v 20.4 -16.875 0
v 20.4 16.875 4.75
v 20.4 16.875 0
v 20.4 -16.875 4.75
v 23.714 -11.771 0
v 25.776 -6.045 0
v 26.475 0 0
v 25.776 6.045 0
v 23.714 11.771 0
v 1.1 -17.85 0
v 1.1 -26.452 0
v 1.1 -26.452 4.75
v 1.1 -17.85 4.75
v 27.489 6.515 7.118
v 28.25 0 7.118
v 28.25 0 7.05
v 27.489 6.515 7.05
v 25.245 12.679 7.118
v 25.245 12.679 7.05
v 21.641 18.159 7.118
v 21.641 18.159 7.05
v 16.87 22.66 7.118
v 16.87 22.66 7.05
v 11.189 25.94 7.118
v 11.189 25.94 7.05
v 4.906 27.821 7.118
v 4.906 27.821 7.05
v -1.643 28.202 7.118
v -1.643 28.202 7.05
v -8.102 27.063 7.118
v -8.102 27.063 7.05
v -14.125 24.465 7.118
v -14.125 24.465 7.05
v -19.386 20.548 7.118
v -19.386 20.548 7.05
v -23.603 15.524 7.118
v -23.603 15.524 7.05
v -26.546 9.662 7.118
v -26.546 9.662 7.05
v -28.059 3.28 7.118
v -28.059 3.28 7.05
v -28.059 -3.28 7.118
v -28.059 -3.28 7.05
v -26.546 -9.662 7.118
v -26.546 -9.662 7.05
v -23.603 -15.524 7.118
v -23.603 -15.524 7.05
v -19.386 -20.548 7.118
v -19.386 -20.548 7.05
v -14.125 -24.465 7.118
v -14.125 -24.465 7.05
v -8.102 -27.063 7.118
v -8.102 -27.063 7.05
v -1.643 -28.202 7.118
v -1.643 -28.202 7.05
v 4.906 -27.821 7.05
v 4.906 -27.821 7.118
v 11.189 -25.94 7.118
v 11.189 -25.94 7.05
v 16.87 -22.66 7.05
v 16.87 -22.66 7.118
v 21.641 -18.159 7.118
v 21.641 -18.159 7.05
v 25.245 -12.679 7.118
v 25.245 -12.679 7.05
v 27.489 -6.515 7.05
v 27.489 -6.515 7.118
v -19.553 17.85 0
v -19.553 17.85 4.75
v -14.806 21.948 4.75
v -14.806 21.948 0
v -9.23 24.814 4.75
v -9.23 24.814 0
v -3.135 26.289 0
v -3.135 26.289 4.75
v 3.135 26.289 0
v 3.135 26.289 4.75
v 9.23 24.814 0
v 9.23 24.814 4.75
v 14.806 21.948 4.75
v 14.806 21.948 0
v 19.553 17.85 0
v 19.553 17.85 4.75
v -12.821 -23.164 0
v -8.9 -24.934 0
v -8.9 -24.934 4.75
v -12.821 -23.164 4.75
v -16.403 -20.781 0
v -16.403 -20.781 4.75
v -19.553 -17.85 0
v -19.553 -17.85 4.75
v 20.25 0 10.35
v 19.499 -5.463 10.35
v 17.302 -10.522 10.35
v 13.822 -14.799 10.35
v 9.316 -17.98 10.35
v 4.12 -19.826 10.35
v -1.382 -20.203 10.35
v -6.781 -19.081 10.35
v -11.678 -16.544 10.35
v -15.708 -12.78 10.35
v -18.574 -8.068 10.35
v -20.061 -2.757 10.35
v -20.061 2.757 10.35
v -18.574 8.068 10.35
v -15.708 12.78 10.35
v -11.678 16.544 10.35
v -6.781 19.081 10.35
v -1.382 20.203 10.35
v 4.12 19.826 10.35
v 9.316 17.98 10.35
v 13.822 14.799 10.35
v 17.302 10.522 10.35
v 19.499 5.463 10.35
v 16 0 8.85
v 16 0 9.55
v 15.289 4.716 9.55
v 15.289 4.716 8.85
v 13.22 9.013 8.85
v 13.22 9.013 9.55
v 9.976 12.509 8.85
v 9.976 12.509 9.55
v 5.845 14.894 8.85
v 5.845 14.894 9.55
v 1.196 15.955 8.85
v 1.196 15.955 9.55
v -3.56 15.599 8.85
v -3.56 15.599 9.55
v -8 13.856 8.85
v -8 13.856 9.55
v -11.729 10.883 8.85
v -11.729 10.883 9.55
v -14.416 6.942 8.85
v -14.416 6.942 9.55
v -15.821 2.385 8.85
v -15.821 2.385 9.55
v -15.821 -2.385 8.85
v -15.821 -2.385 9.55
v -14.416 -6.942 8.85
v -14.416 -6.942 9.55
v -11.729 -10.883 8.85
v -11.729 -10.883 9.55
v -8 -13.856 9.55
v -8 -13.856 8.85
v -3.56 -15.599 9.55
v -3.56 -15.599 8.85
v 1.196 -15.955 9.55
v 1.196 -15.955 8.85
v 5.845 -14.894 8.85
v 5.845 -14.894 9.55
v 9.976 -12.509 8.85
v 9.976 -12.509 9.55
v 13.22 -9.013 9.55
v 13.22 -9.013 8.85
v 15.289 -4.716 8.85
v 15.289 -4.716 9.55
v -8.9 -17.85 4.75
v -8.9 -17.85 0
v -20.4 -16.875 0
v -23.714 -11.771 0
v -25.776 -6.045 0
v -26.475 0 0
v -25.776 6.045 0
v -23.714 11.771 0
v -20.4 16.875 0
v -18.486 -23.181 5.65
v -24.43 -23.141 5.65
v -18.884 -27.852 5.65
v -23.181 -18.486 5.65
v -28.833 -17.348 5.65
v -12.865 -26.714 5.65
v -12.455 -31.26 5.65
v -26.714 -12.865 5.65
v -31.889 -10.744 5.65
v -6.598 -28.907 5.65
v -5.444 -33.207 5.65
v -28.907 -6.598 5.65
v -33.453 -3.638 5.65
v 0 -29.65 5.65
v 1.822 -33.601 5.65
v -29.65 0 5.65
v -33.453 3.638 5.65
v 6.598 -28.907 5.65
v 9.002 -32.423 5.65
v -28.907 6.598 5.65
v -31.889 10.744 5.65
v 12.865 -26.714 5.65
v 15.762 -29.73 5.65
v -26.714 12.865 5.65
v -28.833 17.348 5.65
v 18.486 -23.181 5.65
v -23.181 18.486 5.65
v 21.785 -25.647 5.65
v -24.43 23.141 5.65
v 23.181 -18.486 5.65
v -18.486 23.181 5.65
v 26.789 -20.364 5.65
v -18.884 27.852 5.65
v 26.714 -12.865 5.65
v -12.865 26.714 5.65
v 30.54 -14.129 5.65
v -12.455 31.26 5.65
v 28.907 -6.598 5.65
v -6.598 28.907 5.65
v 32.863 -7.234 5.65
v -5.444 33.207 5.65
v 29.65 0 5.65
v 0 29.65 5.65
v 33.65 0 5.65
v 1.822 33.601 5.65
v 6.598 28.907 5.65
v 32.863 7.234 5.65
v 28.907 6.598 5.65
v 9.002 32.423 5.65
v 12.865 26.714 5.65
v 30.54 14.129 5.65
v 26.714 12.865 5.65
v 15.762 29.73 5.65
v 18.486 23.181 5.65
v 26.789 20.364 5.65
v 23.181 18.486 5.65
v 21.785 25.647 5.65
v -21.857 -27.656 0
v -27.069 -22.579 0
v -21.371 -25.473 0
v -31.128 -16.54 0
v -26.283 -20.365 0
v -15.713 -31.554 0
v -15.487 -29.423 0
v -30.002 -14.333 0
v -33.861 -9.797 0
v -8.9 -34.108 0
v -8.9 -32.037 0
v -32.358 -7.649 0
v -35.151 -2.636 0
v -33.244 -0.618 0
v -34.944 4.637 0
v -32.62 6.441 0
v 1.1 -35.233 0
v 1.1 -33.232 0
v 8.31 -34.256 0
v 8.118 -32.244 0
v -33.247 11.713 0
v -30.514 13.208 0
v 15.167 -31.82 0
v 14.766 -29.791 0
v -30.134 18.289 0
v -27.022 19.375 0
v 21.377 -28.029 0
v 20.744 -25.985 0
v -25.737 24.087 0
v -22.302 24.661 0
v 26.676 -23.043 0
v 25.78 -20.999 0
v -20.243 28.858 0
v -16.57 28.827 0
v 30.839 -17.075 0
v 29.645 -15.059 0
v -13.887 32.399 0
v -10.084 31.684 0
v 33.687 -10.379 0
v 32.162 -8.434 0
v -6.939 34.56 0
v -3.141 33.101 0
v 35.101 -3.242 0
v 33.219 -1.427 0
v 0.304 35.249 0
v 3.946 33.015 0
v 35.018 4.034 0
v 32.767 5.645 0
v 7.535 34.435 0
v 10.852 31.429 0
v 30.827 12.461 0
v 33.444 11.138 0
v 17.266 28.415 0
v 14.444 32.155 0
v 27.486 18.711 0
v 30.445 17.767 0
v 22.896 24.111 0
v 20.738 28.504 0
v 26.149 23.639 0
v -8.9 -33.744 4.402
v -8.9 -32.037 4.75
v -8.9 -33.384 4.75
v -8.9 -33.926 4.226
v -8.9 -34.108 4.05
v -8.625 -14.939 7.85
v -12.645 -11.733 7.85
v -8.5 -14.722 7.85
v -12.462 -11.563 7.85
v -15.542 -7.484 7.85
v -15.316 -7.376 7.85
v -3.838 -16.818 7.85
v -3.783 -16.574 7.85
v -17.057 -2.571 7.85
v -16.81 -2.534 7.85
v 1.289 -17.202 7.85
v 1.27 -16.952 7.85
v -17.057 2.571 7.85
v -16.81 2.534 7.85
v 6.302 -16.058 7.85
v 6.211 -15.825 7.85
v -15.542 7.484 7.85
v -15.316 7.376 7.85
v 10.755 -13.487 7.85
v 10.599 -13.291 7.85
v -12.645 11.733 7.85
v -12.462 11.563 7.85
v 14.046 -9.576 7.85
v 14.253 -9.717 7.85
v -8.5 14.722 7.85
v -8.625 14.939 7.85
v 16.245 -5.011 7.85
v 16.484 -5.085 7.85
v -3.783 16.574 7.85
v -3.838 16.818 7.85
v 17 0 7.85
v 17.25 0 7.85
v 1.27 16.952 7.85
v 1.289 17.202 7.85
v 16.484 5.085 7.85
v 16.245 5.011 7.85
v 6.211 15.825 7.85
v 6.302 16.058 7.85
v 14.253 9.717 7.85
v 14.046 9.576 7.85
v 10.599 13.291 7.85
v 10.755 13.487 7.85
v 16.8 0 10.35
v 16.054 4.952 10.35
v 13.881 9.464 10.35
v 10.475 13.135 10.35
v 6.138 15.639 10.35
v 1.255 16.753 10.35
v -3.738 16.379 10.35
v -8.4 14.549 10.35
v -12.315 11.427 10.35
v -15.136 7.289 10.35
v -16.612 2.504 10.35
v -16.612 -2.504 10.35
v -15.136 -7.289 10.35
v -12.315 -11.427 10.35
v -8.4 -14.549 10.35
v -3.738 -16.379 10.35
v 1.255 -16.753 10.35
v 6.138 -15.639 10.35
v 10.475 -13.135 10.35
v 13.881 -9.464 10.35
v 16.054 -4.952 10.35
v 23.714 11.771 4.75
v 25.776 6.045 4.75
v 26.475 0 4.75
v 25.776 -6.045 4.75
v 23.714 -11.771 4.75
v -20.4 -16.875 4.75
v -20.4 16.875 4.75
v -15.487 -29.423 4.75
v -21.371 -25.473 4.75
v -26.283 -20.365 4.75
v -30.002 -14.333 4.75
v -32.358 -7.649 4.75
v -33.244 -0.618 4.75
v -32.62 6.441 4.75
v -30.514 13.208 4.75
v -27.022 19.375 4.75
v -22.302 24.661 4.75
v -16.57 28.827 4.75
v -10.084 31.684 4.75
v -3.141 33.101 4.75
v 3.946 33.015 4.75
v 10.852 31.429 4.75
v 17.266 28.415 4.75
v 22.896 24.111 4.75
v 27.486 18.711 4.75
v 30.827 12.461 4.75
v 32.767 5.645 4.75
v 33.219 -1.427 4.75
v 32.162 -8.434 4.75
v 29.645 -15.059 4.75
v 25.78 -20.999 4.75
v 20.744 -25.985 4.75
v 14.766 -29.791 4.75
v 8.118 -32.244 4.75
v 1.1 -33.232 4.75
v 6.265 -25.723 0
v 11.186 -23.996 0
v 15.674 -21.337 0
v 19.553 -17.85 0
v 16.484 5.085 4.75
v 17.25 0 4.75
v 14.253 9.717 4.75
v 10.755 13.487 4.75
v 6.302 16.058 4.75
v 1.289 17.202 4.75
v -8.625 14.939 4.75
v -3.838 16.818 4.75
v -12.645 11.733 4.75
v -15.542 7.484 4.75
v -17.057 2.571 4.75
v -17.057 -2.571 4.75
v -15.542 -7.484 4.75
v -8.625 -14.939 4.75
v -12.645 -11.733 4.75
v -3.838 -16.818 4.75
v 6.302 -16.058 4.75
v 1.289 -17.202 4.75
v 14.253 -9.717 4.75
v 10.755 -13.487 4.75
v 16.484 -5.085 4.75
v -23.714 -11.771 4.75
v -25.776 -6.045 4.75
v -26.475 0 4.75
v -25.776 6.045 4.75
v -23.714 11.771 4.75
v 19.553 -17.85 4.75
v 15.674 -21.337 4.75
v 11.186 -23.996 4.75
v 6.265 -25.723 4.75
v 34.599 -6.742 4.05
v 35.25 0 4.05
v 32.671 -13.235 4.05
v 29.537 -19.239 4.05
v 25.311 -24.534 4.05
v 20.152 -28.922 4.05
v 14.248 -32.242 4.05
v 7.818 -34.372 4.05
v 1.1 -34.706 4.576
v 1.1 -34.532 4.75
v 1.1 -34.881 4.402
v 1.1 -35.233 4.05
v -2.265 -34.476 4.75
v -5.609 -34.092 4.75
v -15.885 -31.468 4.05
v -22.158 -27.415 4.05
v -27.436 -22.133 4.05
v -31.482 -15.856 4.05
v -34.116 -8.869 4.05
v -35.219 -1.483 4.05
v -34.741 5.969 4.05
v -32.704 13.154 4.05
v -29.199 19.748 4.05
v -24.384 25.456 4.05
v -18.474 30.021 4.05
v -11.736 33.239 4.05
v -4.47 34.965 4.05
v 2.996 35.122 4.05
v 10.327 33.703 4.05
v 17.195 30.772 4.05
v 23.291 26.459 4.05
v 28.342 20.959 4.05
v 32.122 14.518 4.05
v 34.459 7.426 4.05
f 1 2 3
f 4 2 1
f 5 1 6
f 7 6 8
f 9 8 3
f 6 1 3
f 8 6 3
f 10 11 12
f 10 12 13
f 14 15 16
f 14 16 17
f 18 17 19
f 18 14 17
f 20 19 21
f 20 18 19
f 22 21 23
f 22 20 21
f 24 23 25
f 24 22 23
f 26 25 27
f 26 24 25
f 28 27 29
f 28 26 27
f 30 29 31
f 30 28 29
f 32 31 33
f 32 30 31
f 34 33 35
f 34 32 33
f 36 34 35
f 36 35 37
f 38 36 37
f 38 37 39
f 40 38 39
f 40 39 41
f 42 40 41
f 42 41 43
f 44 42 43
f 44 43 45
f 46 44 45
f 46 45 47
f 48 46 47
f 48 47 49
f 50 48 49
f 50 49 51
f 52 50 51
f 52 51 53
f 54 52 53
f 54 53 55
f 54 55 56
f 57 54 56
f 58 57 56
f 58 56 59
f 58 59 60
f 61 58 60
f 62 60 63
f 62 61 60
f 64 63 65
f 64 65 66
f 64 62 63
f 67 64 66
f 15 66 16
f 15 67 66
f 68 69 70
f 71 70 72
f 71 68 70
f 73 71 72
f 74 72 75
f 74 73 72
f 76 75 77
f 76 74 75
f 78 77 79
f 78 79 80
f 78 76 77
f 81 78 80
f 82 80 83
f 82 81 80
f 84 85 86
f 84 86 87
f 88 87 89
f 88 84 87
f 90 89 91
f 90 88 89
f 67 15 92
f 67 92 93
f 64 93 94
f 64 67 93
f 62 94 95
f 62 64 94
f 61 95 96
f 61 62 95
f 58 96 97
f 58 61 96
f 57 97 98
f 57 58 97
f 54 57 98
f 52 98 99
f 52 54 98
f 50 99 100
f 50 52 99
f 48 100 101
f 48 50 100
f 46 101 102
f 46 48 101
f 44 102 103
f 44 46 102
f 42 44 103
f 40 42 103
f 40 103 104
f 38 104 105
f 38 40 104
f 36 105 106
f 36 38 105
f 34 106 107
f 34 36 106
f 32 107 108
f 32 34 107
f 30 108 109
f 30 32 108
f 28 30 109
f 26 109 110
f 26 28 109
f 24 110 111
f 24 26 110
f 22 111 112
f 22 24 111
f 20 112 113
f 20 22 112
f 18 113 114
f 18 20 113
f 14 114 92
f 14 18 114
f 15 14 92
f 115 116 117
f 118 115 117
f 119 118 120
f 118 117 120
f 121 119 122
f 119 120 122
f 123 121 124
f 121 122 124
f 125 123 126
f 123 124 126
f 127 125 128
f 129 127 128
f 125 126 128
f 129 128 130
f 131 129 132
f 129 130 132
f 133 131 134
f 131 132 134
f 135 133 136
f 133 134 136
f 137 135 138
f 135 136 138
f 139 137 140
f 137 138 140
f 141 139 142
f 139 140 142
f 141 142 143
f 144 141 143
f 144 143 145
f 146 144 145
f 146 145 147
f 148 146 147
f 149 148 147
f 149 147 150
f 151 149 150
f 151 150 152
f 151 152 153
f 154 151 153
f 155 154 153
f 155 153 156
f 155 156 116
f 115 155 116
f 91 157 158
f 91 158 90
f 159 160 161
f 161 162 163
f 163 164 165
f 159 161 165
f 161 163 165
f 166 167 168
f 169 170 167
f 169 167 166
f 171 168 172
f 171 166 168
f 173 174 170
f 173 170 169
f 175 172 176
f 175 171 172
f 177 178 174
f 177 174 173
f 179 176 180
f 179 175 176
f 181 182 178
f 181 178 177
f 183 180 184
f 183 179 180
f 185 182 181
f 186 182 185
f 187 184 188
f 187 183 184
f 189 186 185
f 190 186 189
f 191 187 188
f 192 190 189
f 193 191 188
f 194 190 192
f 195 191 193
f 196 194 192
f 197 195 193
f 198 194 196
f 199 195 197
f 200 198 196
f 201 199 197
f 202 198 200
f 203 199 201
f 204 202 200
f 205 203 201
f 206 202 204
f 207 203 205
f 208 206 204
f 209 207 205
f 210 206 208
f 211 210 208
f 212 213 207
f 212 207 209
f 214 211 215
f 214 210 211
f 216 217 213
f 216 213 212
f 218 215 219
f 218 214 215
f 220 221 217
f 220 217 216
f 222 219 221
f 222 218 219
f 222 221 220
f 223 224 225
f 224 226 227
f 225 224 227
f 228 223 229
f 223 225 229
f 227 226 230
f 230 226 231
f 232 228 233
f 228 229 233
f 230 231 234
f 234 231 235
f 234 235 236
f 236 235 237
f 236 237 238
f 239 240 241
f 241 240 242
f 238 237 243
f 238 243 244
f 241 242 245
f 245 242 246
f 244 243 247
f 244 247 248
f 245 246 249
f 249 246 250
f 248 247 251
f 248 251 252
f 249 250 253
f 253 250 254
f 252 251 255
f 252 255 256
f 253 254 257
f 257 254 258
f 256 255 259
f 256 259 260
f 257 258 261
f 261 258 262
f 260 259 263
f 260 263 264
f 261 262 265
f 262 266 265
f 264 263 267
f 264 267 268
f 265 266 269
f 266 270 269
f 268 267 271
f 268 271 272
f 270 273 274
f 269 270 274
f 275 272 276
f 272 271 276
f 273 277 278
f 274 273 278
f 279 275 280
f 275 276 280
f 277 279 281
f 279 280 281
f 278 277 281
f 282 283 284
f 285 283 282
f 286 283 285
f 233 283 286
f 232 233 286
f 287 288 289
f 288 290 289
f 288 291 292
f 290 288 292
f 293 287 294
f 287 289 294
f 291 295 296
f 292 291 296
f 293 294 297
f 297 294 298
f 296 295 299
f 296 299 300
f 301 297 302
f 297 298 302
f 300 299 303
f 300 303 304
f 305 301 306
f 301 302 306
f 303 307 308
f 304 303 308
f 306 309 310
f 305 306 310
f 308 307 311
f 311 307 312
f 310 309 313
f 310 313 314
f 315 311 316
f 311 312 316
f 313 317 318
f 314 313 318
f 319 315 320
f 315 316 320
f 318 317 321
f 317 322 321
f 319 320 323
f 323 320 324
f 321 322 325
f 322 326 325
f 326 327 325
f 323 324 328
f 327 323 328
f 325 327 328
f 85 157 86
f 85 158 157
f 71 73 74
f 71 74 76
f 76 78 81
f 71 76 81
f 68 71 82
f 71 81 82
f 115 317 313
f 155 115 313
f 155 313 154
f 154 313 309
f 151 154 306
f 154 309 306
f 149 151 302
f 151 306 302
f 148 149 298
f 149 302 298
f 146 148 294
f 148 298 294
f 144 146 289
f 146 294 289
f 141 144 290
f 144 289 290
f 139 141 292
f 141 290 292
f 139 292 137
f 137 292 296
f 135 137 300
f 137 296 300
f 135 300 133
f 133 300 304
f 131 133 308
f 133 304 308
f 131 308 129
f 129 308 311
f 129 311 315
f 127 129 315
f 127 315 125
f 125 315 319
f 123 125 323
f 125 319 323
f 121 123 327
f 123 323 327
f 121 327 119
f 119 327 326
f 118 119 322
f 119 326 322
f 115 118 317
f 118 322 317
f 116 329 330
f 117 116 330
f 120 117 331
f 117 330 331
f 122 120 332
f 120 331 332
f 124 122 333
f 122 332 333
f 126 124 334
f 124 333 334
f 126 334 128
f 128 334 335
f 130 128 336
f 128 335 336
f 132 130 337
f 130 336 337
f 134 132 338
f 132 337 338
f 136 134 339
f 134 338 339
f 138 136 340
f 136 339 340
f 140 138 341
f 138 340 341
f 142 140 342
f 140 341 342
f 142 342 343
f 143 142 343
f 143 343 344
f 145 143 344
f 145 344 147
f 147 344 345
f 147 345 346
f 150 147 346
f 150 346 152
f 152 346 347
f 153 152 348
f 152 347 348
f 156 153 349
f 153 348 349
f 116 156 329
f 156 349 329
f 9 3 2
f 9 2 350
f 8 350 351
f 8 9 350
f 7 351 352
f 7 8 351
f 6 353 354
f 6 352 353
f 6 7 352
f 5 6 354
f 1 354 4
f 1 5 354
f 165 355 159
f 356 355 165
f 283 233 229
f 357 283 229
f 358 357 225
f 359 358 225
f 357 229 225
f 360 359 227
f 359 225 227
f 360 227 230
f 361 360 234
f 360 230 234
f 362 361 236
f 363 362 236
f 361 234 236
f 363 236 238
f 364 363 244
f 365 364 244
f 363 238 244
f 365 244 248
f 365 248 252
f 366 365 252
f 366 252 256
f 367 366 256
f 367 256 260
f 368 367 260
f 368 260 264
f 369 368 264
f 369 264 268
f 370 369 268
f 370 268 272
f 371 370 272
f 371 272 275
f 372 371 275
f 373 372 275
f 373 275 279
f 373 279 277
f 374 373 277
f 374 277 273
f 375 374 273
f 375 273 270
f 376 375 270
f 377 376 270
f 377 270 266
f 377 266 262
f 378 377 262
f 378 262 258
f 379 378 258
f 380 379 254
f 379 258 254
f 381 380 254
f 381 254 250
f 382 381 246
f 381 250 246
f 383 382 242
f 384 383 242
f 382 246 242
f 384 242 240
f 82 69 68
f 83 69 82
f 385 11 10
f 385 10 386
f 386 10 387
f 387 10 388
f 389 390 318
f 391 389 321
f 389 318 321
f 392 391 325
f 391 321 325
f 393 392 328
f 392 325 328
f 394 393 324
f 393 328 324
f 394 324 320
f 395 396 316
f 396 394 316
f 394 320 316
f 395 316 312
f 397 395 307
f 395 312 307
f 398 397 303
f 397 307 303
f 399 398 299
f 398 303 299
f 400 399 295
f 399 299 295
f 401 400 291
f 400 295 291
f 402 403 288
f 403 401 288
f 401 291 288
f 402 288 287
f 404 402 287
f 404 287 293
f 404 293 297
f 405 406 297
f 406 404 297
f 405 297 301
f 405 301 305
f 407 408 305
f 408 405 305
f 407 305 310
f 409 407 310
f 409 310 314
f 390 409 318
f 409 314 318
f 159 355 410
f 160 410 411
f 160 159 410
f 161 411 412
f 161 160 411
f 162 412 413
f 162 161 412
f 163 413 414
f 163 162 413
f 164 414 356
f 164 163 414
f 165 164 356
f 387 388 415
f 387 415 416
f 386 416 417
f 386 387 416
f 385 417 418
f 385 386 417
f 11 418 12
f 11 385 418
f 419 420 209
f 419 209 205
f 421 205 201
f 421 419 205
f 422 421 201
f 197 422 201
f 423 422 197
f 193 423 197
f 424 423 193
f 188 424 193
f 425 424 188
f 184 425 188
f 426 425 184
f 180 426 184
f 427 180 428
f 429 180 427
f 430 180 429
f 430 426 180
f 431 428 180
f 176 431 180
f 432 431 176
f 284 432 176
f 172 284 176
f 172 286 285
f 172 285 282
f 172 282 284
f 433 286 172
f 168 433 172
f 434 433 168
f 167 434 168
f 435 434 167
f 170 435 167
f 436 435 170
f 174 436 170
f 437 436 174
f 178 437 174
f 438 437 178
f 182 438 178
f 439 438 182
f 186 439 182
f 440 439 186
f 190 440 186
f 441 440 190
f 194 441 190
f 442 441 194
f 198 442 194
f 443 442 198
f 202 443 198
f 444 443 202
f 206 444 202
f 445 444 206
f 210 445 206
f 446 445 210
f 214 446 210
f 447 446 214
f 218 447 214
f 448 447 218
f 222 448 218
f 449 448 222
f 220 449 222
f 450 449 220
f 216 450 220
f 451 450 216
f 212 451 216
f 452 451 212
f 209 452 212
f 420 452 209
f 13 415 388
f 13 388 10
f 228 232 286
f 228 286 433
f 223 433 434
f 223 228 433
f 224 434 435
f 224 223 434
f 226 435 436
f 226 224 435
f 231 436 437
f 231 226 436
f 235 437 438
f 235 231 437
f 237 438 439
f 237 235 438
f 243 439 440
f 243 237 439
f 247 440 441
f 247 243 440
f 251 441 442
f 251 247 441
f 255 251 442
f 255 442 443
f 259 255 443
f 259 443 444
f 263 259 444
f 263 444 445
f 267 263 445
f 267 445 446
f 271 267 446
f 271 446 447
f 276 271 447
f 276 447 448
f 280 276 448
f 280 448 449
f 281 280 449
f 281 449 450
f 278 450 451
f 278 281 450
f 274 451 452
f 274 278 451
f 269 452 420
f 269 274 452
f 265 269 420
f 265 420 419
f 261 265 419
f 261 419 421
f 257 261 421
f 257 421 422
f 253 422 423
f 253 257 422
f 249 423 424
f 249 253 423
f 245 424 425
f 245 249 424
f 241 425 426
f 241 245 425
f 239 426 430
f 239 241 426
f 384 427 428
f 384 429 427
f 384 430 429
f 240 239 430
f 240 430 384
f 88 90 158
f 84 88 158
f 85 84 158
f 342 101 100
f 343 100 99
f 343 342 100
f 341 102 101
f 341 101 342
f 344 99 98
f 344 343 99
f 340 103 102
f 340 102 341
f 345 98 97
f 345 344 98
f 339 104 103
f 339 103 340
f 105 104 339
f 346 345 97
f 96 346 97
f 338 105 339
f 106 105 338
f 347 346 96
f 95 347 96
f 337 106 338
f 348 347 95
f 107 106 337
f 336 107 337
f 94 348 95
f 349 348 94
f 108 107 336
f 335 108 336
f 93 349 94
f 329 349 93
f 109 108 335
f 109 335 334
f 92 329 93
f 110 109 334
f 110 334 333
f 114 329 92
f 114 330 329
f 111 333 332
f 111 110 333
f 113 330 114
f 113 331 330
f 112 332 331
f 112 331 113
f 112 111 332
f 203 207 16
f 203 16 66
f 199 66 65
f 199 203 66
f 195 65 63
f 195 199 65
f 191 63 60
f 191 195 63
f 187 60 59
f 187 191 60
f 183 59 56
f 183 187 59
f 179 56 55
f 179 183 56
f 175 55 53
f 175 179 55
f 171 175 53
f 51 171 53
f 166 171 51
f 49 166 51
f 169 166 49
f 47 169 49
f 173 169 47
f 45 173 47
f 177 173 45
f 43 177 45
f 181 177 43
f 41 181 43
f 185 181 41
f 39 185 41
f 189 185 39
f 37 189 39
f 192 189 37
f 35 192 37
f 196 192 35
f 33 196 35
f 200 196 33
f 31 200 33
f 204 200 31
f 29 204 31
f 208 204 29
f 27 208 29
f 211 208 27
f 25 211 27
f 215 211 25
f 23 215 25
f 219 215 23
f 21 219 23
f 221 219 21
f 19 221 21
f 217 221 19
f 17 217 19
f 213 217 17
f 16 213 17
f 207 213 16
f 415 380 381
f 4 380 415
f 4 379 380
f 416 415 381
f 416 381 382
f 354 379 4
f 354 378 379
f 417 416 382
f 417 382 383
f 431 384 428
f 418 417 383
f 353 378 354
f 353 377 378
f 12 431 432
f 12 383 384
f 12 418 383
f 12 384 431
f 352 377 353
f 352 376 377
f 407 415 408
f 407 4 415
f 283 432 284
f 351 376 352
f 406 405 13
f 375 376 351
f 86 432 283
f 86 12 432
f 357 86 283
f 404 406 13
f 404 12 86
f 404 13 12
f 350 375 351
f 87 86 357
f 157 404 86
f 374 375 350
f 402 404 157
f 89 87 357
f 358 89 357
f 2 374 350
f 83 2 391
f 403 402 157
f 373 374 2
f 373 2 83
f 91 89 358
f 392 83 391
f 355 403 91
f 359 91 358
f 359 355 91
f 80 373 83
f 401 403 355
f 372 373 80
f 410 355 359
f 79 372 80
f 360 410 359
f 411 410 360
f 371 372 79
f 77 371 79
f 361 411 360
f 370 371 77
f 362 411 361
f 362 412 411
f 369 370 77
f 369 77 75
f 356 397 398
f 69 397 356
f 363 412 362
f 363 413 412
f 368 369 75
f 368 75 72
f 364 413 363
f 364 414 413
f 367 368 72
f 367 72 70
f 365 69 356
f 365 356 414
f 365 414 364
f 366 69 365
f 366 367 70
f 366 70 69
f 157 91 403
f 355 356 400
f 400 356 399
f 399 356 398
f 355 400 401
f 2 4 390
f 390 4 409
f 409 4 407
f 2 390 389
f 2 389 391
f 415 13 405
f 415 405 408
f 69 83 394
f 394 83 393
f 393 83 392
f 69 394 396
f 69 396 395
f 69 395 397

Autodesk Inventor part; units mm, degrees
ref_plane "YZ Plane" through (0, 0, 0) normal (1, 0, 0) x (0, 1, 0)
ref_plane "XZ Plane" through (0, 0, 0) normal (0, 1, 0) x (-1, 0, 0)
ref_plane "XY Plane" through (0, 0, 0) normal (0, 0, 1) x (1, 0, 0)
sketch "Sketch1" plane through (0, 0, 0) normal (0, 0, 1) x (1, 0, 0)
  circle A0 centre (0, 0) radius 33.25
  circle A1 centre (0, 0) radius 26.475
  circle A2 centre (0, 0) radius 35.25
  dimension "d0" = 66.5
  dimension "d1" = 52.95
  dimension "d2" = 2
extrude "Extrusion1" add sketch "Sketch1" along normal blind 10.35
sketch "Sketch2" plane through (0, 0, 10.35) normal (0, 0, 1) x (1, 0, 0)
  circle A0 centre (0, 0) radius 35.25 projected
extrude "Extrusion2" add sketch "Sketch2" against normal blind 0.5
sketch "Sketch3" plane through (0, 0, 10.35) normal (0, 0, 1) x (1, 0, 0)
  circle A0 centre (0, 0) radius 16
  dimension "d7" = 32
extrude "Extrusion3" cut sketch "Sketch3" against normal blind 2.5
sketch "Sketch4" plane through (0, 0, 7.85) normal (0, 0, 1) x (1, 0, 0)
  circle A0 centre (0, 0) radius 17.25
  dimension "d10" = 34.5
extrude "Extrusion4" cut sketch "Sketch4" against normal blind 3.1
sketch "Sketch5" plane through (0, 0, 4.75) normal (0, 0, 1) x (1, 0, 0)
  line L0 (-20.4, 17.85) -> (20.4, 17.85)
  line L1 (20.4, 17.85) -> (20.4, -17.85)
  line L2 (20.4, -17.85) -> (-20.4, -17.85)
  line L3 (-20.4, -17.85) -> (-20.4, 17.85)
  point P0 (0, 0)
  dimension "d13" = 40.8
  dimension "d14" = 35.7
  dimension "d15" = 17.85
  dimension "d16" = 20.4
extrude "Extrusion5" cut sketch "Sketch5" against normal through all
chamfer "Chamfer1" distance 0.8 angle 45 1 edges at (-16, 0, 10.35)
sketch "Sketch6" plane through (0, 0, 9.85) normal (0, 0, -1) x (-1, 0, 0)
  circle A0 centre (0, 0) radius 33.25 projected
  circle A1 centre (0, 0) radius 26.475 projected
extrude "Extrusion6" add sketch "Sketch6" along normal up to surface (5.1 mm away)
chamfer "Chamfer4" distance 1 angle 45 1 edges at (-16, 0, 7.85)
sketch "Sketch7" plane through (0, 0, 0) normal (0, 0, -1) x (-1, 0, 0)
  line L0 (8.9, -41.2726) -> (-1.1, -41.2726)
  line L1 (-1.1, -41.2726) -> (-1.1, 4.8372)
  line L2 (-1.1, 4.8372) -> (8.9, 4.8372)
  line L3 (8.9, 4.8372) -> (8.9, -41.2726)
  line L4 (19.5526, -17.85) -> (-19.5526, -17.85) projected
  line L5 (-20.4, -16.875) -> (-20.4, 16.875) projected
  line L6 (20.4, 16.875) -> (20.4, -16.875) projected
  point P0 (0, 0)
  point P1 (3.9, -41.2726)
  dimension "d36" = 10
  dimension "d40" = 21.5
extrude "Extrusion7" cut sketch "Sketch7" against normal up to surface (4.75 mm away)
sketch "Sketch8" plane through (0, 0, 10.35) normal (0, 0, 1) x (1, 0, 0)
  circle A0 centre (0, 0) radius 35.25 projected
  circle A1 centre (0, 0) radius 28.25
  dimension "d41" = 7
extrude "Extrusion8" cut sketch "Sketch8" against normal blind 4.7
chamfer "Chamfer5" distance 8 angle 22 1 edges at (-28.25, 0, 10.35) measured on face at (23.997, -3.5937, 10.35)
chamfer "Chamfer6" distance 1.6 angle 45 1 edges at (-35.25, 0, 5.65)
chamfer "Chamfer7" distance 1.4 angle 45 1 edges at (-28.25, 0, 5.65)
equation "\"d15\" = 0.5 * d14"
equation "\"d16\" = 0.5 * d13"
properties part number "controls_knob_cover"
